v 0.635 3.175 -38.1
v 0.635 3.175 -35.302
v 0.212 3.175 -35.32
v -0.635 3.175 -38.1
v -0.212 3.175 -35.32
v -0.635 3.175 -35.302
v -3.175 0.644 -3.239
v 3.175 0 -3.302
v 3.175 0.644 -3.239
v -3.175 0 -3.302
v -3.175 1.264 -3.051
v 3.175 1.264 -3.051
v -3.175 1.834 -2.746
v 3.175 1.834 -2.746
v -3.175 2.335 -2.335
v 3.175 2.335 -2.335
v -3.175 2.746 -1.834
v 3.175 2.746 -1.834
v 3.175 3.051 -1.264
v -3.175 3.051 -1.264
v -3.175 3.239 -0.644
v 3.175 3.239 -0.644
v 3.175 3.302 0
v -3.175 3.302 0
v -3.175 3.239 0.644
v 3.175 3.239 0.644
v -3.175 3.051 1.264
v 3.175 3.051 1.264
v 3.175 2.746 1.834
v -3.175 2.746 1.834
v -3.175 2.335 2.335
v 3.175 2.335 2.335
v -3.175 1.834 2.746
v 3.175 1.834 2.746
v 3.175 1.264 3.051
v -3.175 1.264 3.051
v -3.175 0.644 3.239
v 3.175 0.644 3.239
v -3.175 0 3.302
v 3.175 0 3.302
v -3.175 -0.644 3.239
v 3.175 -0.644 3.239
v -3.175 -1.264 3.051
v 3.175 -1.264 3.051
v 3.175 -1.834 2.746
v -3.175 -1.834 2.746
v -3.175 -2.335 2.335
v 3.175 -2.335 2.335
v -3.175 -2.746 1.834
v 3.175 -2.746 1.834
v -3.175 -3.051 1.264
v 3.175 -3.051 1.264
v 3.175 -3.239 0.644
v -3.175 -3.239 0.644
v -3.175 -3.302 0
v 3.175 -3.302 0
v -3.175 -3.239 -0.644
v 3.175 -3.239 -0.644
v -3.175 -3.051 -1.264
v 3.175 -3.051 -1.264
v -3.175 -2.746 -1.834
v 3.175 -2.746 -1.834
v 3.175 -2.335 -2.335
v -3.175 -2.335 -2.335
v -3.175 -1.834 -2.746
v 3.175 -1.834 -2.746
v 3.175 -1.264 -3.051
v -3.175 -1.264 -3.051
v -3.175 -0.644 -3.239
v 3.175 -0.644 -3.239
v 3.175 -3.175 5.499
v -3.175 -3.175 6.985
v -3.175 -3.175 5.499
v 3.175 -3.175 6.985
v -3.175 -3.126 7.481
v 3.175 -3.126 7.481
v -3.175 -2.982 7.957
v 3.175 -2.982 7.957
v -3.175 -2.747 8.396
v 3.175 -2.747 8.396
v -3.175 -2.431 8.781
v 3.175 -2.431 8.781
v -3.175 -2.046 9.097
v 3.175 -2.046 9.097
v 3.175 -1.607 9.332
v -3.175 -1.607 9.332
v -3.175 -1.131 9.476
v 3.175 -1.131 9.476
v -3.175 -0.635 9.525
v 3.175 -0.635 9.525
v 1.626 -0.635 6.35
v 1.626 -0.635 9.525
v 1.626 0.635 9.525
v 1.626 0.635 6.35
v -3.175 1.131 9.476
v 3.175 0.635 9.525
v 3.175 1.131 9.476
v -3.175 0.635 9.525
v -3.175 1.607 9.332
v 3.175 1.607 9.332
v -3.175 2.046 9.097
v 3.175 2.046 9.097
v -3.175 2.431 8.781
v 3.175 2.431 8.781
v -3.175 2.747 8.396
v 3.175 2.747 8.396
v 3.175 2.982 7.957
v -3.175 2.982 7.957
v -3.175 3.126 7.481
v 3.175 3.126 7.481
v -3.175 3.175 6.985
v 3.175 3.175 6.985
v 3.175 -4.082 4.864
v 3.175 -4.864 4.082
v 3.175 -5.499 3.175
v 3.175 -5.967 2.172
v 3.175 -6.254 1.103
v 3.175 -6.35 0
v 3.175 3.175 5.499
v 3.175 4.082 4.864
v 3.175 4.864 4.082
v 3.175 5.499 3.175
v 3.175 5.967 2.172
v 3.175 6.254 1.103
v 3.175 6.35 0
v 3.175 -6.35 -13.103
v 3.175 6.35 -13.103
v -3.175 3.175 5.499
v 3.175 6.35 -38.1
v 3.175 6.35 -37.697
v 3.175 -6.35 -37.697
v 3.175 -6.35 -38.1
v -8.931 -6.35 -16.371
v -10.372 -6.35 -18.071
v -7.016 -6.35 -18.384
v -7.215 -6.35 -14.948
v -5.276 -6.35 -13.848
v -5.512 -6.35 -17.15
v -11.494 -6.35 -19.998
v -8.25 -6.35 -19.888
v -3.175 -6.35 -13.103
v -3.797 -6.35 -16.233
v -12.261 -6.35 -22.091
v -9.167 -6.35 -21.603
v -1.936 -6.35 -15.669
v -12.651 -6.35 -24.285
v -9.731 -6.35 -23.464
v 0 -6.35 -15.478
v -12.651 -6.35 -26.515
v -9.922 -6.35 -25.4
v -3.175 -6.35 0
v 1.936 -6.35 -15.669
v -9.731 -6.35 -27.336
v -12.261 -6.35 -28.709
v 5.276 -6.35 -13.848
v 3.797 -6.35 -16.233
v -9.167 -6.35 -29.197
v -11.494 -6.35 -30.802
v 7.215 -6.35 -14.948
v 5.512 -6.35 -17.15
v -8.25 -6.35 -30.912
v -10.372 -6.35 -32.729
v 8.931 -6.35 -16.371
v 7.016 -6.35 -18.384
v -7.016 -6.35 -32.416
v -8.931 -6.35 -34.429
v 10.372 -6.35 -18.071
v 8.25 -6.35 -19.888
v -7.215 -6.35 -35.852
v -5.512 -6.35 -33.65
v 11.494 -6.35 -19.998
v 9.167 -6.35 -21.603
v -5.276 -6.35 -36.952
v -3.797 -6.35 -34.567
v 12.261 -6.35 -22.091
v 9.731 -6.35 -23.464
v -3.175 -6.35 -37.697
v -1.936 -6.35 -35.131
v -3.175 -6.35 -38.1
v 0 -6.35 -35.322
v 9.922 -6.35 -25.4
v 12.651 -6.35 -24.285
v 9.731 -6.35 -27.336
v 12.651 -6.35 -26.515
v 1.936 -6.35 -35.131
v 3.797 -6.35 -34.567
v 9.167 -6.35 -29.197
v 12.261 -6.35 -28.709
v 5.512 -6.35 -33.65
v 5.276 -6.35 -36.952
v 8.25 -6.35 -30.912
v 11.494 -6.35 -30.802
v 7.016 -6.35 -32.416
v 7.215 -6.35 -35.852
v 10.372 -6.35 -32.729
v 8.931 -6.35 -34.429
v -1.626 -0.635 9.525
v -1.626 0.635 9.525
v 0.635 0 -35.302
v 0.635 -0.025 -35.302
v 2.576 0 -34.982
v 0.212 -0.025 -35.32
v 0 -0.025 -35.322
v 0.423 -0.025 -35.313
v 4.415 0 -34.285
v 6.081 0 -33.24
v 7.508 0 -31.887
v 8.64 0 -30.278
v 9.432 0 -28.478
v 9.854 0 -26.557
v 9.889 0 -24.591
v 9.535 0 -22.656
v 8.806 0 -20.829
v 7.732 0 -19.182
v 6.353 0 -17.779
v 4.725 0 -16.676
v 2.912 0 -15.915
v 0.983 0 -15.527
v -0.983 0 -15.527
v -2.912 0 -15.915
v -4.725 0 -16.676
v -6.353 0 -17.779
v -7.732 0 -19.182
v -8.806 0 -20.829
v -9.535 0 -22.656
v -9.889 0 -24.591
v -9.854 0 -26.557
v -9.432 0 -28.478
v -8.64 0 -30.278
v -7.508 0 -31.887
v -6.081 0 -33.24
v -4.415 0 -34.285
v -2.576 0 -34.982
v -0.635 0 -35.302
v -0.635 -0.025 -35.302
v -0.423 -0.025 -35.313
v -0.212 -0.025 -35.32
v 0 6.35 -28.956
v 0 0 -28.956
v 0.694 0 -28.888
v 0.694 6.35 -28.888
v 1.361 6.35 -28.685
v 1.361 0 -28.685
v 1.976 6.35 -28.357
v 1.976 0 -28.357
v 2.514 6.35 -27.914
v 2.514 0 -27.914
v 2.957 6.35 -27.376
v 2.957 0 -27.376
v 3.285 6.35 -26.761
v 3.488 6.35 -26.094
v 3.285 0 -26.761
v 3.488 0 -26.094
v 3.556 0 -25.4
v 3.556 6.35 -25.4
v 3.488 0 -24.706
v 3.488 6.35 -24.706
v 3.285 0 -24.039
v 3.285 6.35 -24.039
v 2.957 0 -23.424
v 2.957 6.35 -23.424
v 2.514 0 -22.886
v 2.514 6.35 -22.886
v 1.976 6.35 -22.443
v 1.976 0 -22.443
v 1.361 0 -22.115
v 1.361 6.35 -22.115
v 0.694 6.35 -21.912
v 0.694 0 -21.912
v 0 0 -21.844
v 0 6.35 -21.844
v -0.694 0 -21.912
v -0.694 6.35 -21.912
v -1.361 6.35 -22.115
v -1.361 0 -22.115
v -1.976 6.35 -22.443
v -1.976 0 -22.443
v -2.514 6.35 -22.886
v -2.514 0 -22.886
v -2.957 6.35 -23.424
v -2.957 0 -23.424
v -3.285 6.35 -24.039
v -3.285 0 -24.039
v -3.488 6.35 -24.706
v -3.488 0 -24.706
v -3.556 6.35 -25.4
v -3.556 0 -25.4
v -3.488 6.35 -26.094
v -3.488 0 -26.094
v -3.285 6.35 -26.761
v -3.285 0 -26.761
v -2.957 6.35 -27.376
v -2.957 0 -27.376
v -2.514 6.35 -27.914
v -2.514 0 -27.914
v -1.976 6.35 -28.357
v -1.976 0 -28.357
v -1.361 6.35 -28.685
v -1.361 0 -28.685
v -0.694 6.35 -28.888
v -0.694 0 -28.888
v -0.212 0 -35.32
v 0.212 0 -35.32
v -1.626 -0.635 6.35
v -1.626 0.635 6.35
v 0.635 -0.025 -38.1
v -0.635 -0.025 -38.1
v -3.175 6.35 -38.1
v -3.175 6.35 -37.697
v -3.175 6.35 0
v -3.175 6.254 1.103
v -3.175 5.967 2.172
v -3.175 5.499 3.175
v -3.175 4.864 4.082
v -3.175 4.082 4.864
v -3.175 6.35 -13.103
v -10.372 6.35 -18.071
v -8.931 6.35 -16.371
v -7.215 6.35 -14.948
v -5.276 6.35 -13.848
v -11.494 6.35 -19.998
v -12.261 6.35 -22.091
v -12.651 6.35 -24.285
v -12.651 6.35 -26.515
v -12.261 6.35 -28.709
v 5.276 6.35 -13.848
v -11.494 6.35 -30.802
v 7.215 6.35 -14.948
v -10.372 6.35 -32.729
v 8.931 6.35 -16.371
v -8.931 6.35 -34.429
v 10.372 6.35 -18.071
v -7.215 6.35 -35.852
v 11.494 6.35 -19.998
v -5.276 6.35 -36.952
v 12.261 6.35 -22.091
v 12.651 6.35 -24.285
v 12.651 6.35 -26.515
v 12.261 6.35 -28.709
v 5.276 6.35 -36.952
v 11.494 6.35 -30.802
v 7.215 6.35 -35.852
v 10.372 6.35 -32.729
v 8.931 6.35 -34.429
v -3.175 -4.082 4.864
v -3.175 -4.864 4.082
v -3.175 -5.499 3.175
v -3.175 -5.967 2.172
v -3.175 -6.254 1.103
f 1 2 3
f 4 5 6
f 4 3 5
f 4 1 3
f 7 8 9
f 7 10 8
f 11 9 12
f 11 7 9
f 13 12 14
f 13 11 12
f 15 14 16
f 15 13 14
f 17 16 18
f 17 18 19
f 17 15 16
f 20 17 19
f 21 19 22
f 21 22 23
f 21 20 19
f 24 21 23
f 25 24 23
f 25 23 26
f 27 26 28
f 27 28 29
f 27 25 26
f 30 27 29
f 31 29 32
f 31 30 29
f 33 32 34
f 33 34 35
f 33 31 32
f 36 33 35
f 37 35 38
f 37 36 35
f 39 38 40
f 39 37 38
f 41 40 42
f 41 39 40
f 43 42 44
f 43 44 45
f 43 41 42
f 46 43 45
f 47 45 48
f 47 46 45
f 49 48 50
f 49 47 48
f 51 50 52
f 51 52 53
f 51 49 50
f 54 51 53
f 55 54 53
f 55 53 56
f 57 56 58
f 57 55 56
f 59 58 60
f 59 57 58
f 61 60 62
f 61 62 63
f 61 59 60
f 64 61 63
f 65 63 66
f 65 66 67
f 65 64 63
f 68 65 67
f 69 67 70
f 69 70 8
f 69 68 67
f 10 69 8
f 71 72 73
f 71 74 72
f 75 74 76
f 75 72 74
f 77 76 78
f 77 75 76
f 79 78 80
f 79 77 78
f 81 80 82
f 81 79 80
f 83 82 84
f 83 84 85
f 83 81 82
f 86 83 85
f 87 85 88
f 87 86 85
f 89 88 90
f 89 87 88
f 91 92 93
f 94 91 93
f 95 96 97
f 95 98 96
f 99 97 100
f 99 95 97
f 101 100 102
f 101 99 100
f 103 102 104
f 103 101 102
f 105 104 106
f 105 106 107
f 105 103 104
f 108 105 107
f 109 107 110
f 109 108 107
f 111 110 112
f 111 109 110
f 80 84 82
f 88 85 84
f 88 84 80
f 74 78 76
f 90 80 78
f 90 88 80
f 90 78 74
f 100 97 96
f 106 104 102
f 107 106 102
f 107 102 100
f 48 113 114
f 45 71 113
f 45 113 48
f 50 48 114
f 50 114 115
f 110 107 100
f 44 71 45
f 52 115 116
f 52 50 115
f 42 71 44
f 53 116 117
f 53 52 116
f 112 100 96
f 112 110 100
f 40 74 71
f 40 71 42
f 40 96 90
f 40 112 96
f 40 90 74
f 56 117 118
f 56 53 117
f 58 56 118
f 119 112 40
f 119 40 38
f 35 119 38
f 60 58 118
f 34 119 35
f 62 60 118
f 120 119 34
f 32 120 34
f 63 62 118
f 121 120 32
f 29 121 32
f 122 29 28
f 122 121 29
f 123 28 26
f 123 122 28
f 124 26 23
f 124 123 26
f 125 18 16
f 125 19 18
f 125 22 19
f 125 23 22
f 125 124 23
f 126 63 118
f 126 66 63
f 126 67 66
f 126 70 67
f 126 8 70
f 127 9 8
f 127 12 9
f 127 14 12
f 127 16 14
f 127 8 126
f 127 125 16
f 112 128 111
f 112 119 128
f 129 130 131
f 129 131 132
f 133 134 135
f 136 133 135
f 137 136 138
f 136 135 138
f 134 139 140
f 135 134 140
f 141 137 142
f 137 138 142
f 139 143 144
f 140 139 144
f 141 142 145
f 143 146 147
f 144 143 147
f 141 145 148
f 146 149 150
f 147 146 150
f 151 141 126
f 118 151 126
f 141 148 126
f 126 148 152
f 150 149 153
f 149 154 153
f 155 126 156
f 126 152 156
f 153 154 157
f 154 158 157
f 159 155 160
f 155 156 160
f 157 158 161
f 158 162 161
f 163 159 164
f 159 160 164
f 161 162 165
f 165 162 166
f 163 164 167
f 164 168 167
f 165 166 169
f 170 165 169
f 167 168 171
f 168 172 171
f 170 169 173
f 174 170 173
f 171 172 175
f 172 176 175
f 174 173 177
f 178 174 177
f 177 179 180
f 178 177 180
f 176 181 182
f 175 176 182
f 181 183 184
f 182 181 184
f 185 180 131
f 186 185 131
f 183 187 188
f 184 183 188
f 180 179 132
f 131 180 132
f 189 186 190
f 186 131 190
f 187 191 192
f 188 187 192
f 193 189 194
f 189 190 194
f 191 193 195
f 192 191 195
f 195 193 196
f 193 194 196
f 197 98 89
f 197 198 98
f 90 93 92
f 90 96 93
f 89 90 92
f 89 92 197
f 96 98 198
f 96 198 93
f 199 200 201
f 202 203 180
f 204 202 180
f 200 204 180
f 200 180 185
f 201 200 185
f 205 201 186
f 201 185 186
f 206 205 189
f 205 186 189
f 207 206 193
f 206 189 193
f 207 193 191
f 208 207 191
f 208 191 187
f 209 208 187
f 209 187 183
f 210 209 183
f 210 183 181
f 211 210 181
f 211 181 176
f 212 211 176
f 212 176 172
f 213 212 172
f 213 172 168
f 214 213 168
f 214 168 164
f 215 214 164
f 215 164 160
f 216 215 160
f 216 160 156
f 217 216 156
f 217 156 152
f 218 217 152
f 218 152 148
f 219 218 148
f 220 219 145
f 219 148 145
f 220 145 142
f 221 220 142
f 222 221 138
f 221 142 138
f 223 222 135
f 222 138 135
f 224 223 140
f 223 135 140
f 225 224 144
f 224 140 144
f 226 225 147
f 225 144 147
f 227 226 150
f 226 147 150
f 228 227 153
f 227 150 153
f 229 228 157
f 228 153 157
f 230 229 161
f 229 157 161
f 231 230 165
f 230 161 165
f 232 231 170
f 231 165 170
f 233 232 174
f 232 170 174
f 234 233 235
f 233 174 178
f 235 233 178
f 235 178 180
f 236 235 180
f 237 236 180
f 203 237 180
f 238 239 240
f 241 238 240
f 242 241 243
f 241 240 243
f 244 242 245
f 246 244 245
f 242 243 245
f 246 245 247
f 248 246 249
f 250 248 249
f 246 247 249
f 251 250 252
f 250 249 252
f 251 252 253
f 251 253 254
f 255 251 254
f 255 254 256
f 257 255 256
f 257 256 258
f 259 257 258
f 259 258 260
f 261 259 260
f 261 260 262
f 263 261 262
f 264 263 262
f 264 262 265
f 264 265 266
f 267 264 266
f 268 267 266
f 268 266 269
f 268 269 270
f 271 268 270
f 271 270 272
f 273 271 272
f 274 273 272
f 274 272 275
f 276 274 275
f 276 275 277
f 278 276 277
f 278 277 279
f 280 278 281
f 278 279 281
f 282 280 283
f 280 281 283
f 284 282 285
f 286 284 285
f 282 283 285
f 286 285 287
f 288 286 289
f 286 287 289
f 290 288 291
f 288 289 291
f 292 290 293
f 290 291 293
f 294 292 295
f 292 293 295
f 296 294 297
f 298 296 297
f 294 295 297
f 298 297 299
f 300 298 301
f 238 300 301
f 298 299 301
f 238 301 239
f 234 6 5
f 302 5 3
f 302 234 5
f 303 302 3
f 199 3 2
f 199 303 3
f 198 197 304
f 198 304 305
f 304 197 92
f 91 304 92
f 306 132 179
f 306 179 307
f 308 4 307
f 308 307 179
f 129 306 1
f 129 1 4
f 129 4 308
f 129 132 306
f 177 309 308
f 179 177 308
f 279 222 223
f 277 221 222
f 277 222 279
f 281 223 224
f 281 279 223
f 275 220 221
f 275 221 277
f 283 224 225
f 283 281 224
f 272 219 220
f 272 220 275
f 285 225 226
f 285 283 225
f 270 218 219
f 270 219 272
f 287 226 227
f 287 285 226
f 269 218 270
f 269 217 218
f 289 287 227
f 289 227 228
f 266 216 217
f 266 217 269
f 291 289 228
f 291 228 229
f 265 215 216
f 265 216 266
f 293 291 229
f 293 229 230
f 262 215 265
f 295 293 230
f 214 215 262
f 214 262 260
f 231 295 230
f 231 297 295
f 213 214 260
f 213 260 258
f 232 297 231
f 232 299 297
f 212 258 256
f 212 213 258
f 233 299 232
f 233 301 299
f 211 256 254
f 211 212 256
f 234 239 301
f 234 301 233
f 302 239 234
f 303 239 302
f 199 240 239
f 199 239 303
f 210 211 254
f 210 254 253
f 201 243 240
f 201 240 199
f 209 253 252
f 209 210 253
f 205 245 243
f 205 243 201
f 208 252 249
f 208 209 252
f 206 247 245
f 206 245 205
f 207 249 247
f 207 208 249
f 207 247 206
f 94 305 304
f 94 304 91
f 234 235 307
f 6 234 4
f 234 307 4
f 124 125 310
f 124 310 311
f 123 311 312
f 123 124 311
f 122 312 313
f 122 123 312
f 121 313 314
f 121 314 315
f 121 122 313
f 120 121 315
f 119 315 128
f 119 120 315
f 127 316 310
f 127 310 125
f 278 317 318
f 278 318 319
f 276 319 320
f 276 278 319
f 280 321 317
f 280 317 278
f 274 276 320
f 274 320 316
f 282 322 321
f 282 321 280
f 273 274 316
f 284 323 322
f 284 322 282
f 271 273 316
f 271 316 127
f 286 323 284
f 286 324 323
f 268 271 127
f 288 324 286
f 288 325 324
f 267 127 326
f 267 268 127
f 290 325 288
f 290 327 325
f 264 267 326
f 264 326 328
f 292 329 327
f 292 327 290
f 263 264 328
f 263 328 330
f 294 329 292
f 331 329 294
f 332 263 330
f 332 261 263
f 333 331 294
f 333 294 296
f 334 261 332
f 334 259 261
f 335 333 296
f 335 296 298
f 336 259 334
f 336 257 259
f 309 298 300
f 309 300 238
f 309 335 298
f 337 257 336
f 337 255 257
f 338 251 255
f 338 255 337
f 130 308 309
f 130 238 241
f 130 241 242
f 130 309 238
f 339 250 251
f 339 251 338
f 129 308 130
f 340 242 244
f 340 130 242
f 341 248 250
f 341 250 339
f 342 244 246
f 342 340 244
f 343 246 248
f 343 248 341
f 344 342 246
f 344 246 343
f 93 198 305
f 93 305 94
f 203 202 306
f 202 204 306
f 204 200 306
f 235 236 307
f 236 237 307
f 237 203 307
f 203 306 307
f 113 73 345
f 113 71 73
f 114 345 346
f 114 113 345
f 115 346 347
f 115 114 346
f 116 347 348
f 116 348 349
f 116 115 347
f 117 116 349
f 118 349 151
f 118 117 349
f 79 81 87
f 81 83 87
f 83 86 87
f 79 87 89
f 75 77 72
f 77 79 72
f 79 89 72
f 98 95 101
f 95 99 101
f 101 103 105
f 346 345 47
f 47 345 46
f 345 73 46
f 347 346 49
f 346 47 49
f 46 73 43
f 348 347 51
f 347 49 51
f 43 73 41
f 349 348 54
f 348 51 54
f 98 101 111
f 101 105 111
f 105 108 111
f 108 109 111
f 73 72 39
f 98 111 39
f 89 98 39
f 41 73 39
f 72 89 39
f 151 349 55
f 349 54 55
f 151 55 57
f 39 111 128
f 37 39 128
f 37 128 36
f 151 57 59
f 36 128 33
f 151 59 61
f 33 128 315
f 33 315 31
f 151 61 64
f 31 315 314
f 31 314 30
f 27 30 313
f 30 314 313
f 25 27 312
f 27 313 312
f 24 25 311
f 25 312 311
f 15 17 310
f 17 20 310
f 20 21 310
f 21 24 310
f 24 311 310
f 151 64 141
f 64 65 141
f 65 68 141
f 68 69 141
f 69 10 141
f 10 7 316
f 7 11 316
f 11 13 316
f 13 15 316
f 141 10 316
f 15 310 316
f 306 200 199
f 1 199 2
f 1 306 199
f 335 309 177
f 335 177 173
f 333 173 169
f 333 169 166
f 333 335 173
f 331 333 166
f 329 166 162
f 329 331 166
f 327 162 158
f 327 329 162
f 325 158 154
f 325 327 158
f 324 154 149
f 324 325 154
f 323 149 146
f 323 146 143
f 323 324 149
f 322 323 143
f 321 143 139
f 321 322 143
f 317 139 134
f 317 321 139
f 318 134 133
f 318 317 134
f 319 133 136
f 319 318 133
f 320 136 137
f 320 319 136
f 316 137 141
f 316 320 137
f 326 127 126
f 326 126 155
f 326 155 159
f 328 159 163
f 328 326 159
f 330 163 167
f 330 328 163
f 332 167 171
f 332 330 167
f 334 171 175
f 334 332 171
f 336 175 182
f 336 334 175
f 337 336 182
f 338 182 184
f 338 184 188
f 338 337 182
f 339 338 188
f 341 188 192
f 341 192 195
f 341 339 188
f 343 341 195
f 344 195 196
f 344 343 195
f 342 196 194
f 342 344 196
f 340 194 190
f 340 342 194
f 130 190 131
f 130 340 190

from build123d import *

# Parameters (mm, degrees)
SKETCH1_R               = 3.302
BOSS_EXTRUDE1_DEPTH     = 3.175
SKETCH2_R               = 12.7
BOSS_EXTRUDE2_DEPTH     = 12.7
CUT_EXTRUDE1_REACH      = 44.121
SKETCH3_R               = 3.556
SKETCH4_R               = 9.921875
CUT_EXTRUDE2_DEPTH      = 6.35
CUT_EXTRUDE3_REACH      = 51.697
CUT_EXTRUDE3_END_RADIUS = 9.921875
SKETCH5_W               = 1.27
SKETCH5_H               = 3.2004
SKETCH6_W               = 3.2512
SKETCH6_H               = 1.27
CUT_EXTRUDE4_DEPTH      = 3.175
FILLET2_R               = 2.54


with BuildPart() as part:
    # Sketch1 → Boss-Extrude1 (new, symmetric)
    with BuildSketch(Plane(origin=(0, 0, 0), x_dir=(0, 0, -1), z_dir=(1, 0, 0))):
        with BuildLine():
            Line((0, -6.35), (38.1, -6.35))
            Line((38.1, -6.35), (38.1, 6.35))
            Line((38.1, 6.35), (0, 6.35))
            ThreePointArc((0, 6.35), (-3.175, 5.499261314), (-5.499261314, 3.175))
            Line((-5.499261314, 3.175), (-9.525, 3.175))
            Line((-9.525, 3.175), (-9.525, -3.175))
            Line((-9.525, -3.175), (-5.499261314, -3.175))
            ThreePointArc((-5.499261314, -3.175), (-3.175, -5.499261314), (0, -6.35))
        make_face()
        Circle(SKETCH1_R, mode=Mode.SUBTRACT)
    extrude(amount=BOSS_EXTRUDE1_DEPTH, both=True)

    # Sketch2 → Boss-Extrude2 (add)
    with BuildSketch(Plane(origin=(0, 6.35, 0), x_dir=(1, 0, 0), z_dir=(0, 1, 0))):
        with Locations((0, 25.4)):
            Circle(SKETCH2_R)
    extrude(amount=-BOSS_EXTRUDE2_DEPTH)

    # Sketch3 → Cut-Extrude1 (cut, up to next)
    with BuildSketch(Plane.XZ.offset(6.35), mode=Mode.PRIVATE) as cut_extrude1_sk1:
        with Locations(Location((0, -25.4, 0), (0, 0, 270))):
            Circle(SKETCH3_R)
    cut_extrude1_tool1 = extrude(cut_extrude1_sk1.sketch, amount=-CUT_EXTRUDE1_REACH, mode=Mode.PRIVATE) & part.part
    add(cut_extrude1_tool1.solids().sort_by_distance((0, -6.35, -25.4))[0], mode=Mode.SUBTRACT)

    # Sketch4 → Cut-Extrude2 (cut)
    with BuildSketch(Plane.XZ.offset(6.35)):
        with Locations(Location((0, -25.4, 0), (0, 0, 270))):
            Circle(SKETCH4_R)
    extrude(amount=-CUT_EXTRUDE2_DEPTH, mode=Mode.SUBTRACT)

    # Cut-Extrude3: up to this cylinder (the profile starts outside it)
    cut_extrude3_end = Plane(origin=(0, 1.5748, -25.4), z_dir=(0, -1, 0)) * Cylinder(CUT_EXTRUDE3_END_RADIUS, 124.23775, mode=Mode.PRIVATE)
    # Sketch5 → Cut-Extrude3 (cut, up to the surface)
    with BuildSketch(Plane(origin=(0, 0, -38.1), x_dir=(-1, 0, 0), z_dir=(0, 0, -1)), mode=Mode.PRIVATE) as cut_extrude3_sk1:
        with Locations((0, 1.5748)):
            Rectangle(SKETCH5_W, SKETCH5_H)
    cut_extrude3_tool1 = extrude(cut_extrude3_sk1.sketch, amount=-CUT_EXTRUDE3_REACH, mode=Mode.PRIVATE) - cut_extrude3_end
    add(cut_extrude3_tool1.solids().sort_by_distance((0, 1.5748, -38.1))[0], mode=Mode.SUBTRACT)

    # Sketch6 → Cut-Extrude4 (cut)
    with BuildSketch(Plane.XY.offset(9.525)):
        Rectangle(SKETCH6_W, SKETCH6_H)
    extrude(amount=-CUT_EXTRUDE4_DEPTH, mode=Mode.SUBTRACT)

    # Fillet2
    fillet2_edges = [part.edges().sort_by_distance(p)[0] for p in [
        (0, -3.175, 9.525),
        (0, 3.175, 9.525),
    ]]
    fillet(fillet2_edges, radius=FILLET2_R - 0.0001)  # a hair under: the kernel refuses the full size


solid = part.part
